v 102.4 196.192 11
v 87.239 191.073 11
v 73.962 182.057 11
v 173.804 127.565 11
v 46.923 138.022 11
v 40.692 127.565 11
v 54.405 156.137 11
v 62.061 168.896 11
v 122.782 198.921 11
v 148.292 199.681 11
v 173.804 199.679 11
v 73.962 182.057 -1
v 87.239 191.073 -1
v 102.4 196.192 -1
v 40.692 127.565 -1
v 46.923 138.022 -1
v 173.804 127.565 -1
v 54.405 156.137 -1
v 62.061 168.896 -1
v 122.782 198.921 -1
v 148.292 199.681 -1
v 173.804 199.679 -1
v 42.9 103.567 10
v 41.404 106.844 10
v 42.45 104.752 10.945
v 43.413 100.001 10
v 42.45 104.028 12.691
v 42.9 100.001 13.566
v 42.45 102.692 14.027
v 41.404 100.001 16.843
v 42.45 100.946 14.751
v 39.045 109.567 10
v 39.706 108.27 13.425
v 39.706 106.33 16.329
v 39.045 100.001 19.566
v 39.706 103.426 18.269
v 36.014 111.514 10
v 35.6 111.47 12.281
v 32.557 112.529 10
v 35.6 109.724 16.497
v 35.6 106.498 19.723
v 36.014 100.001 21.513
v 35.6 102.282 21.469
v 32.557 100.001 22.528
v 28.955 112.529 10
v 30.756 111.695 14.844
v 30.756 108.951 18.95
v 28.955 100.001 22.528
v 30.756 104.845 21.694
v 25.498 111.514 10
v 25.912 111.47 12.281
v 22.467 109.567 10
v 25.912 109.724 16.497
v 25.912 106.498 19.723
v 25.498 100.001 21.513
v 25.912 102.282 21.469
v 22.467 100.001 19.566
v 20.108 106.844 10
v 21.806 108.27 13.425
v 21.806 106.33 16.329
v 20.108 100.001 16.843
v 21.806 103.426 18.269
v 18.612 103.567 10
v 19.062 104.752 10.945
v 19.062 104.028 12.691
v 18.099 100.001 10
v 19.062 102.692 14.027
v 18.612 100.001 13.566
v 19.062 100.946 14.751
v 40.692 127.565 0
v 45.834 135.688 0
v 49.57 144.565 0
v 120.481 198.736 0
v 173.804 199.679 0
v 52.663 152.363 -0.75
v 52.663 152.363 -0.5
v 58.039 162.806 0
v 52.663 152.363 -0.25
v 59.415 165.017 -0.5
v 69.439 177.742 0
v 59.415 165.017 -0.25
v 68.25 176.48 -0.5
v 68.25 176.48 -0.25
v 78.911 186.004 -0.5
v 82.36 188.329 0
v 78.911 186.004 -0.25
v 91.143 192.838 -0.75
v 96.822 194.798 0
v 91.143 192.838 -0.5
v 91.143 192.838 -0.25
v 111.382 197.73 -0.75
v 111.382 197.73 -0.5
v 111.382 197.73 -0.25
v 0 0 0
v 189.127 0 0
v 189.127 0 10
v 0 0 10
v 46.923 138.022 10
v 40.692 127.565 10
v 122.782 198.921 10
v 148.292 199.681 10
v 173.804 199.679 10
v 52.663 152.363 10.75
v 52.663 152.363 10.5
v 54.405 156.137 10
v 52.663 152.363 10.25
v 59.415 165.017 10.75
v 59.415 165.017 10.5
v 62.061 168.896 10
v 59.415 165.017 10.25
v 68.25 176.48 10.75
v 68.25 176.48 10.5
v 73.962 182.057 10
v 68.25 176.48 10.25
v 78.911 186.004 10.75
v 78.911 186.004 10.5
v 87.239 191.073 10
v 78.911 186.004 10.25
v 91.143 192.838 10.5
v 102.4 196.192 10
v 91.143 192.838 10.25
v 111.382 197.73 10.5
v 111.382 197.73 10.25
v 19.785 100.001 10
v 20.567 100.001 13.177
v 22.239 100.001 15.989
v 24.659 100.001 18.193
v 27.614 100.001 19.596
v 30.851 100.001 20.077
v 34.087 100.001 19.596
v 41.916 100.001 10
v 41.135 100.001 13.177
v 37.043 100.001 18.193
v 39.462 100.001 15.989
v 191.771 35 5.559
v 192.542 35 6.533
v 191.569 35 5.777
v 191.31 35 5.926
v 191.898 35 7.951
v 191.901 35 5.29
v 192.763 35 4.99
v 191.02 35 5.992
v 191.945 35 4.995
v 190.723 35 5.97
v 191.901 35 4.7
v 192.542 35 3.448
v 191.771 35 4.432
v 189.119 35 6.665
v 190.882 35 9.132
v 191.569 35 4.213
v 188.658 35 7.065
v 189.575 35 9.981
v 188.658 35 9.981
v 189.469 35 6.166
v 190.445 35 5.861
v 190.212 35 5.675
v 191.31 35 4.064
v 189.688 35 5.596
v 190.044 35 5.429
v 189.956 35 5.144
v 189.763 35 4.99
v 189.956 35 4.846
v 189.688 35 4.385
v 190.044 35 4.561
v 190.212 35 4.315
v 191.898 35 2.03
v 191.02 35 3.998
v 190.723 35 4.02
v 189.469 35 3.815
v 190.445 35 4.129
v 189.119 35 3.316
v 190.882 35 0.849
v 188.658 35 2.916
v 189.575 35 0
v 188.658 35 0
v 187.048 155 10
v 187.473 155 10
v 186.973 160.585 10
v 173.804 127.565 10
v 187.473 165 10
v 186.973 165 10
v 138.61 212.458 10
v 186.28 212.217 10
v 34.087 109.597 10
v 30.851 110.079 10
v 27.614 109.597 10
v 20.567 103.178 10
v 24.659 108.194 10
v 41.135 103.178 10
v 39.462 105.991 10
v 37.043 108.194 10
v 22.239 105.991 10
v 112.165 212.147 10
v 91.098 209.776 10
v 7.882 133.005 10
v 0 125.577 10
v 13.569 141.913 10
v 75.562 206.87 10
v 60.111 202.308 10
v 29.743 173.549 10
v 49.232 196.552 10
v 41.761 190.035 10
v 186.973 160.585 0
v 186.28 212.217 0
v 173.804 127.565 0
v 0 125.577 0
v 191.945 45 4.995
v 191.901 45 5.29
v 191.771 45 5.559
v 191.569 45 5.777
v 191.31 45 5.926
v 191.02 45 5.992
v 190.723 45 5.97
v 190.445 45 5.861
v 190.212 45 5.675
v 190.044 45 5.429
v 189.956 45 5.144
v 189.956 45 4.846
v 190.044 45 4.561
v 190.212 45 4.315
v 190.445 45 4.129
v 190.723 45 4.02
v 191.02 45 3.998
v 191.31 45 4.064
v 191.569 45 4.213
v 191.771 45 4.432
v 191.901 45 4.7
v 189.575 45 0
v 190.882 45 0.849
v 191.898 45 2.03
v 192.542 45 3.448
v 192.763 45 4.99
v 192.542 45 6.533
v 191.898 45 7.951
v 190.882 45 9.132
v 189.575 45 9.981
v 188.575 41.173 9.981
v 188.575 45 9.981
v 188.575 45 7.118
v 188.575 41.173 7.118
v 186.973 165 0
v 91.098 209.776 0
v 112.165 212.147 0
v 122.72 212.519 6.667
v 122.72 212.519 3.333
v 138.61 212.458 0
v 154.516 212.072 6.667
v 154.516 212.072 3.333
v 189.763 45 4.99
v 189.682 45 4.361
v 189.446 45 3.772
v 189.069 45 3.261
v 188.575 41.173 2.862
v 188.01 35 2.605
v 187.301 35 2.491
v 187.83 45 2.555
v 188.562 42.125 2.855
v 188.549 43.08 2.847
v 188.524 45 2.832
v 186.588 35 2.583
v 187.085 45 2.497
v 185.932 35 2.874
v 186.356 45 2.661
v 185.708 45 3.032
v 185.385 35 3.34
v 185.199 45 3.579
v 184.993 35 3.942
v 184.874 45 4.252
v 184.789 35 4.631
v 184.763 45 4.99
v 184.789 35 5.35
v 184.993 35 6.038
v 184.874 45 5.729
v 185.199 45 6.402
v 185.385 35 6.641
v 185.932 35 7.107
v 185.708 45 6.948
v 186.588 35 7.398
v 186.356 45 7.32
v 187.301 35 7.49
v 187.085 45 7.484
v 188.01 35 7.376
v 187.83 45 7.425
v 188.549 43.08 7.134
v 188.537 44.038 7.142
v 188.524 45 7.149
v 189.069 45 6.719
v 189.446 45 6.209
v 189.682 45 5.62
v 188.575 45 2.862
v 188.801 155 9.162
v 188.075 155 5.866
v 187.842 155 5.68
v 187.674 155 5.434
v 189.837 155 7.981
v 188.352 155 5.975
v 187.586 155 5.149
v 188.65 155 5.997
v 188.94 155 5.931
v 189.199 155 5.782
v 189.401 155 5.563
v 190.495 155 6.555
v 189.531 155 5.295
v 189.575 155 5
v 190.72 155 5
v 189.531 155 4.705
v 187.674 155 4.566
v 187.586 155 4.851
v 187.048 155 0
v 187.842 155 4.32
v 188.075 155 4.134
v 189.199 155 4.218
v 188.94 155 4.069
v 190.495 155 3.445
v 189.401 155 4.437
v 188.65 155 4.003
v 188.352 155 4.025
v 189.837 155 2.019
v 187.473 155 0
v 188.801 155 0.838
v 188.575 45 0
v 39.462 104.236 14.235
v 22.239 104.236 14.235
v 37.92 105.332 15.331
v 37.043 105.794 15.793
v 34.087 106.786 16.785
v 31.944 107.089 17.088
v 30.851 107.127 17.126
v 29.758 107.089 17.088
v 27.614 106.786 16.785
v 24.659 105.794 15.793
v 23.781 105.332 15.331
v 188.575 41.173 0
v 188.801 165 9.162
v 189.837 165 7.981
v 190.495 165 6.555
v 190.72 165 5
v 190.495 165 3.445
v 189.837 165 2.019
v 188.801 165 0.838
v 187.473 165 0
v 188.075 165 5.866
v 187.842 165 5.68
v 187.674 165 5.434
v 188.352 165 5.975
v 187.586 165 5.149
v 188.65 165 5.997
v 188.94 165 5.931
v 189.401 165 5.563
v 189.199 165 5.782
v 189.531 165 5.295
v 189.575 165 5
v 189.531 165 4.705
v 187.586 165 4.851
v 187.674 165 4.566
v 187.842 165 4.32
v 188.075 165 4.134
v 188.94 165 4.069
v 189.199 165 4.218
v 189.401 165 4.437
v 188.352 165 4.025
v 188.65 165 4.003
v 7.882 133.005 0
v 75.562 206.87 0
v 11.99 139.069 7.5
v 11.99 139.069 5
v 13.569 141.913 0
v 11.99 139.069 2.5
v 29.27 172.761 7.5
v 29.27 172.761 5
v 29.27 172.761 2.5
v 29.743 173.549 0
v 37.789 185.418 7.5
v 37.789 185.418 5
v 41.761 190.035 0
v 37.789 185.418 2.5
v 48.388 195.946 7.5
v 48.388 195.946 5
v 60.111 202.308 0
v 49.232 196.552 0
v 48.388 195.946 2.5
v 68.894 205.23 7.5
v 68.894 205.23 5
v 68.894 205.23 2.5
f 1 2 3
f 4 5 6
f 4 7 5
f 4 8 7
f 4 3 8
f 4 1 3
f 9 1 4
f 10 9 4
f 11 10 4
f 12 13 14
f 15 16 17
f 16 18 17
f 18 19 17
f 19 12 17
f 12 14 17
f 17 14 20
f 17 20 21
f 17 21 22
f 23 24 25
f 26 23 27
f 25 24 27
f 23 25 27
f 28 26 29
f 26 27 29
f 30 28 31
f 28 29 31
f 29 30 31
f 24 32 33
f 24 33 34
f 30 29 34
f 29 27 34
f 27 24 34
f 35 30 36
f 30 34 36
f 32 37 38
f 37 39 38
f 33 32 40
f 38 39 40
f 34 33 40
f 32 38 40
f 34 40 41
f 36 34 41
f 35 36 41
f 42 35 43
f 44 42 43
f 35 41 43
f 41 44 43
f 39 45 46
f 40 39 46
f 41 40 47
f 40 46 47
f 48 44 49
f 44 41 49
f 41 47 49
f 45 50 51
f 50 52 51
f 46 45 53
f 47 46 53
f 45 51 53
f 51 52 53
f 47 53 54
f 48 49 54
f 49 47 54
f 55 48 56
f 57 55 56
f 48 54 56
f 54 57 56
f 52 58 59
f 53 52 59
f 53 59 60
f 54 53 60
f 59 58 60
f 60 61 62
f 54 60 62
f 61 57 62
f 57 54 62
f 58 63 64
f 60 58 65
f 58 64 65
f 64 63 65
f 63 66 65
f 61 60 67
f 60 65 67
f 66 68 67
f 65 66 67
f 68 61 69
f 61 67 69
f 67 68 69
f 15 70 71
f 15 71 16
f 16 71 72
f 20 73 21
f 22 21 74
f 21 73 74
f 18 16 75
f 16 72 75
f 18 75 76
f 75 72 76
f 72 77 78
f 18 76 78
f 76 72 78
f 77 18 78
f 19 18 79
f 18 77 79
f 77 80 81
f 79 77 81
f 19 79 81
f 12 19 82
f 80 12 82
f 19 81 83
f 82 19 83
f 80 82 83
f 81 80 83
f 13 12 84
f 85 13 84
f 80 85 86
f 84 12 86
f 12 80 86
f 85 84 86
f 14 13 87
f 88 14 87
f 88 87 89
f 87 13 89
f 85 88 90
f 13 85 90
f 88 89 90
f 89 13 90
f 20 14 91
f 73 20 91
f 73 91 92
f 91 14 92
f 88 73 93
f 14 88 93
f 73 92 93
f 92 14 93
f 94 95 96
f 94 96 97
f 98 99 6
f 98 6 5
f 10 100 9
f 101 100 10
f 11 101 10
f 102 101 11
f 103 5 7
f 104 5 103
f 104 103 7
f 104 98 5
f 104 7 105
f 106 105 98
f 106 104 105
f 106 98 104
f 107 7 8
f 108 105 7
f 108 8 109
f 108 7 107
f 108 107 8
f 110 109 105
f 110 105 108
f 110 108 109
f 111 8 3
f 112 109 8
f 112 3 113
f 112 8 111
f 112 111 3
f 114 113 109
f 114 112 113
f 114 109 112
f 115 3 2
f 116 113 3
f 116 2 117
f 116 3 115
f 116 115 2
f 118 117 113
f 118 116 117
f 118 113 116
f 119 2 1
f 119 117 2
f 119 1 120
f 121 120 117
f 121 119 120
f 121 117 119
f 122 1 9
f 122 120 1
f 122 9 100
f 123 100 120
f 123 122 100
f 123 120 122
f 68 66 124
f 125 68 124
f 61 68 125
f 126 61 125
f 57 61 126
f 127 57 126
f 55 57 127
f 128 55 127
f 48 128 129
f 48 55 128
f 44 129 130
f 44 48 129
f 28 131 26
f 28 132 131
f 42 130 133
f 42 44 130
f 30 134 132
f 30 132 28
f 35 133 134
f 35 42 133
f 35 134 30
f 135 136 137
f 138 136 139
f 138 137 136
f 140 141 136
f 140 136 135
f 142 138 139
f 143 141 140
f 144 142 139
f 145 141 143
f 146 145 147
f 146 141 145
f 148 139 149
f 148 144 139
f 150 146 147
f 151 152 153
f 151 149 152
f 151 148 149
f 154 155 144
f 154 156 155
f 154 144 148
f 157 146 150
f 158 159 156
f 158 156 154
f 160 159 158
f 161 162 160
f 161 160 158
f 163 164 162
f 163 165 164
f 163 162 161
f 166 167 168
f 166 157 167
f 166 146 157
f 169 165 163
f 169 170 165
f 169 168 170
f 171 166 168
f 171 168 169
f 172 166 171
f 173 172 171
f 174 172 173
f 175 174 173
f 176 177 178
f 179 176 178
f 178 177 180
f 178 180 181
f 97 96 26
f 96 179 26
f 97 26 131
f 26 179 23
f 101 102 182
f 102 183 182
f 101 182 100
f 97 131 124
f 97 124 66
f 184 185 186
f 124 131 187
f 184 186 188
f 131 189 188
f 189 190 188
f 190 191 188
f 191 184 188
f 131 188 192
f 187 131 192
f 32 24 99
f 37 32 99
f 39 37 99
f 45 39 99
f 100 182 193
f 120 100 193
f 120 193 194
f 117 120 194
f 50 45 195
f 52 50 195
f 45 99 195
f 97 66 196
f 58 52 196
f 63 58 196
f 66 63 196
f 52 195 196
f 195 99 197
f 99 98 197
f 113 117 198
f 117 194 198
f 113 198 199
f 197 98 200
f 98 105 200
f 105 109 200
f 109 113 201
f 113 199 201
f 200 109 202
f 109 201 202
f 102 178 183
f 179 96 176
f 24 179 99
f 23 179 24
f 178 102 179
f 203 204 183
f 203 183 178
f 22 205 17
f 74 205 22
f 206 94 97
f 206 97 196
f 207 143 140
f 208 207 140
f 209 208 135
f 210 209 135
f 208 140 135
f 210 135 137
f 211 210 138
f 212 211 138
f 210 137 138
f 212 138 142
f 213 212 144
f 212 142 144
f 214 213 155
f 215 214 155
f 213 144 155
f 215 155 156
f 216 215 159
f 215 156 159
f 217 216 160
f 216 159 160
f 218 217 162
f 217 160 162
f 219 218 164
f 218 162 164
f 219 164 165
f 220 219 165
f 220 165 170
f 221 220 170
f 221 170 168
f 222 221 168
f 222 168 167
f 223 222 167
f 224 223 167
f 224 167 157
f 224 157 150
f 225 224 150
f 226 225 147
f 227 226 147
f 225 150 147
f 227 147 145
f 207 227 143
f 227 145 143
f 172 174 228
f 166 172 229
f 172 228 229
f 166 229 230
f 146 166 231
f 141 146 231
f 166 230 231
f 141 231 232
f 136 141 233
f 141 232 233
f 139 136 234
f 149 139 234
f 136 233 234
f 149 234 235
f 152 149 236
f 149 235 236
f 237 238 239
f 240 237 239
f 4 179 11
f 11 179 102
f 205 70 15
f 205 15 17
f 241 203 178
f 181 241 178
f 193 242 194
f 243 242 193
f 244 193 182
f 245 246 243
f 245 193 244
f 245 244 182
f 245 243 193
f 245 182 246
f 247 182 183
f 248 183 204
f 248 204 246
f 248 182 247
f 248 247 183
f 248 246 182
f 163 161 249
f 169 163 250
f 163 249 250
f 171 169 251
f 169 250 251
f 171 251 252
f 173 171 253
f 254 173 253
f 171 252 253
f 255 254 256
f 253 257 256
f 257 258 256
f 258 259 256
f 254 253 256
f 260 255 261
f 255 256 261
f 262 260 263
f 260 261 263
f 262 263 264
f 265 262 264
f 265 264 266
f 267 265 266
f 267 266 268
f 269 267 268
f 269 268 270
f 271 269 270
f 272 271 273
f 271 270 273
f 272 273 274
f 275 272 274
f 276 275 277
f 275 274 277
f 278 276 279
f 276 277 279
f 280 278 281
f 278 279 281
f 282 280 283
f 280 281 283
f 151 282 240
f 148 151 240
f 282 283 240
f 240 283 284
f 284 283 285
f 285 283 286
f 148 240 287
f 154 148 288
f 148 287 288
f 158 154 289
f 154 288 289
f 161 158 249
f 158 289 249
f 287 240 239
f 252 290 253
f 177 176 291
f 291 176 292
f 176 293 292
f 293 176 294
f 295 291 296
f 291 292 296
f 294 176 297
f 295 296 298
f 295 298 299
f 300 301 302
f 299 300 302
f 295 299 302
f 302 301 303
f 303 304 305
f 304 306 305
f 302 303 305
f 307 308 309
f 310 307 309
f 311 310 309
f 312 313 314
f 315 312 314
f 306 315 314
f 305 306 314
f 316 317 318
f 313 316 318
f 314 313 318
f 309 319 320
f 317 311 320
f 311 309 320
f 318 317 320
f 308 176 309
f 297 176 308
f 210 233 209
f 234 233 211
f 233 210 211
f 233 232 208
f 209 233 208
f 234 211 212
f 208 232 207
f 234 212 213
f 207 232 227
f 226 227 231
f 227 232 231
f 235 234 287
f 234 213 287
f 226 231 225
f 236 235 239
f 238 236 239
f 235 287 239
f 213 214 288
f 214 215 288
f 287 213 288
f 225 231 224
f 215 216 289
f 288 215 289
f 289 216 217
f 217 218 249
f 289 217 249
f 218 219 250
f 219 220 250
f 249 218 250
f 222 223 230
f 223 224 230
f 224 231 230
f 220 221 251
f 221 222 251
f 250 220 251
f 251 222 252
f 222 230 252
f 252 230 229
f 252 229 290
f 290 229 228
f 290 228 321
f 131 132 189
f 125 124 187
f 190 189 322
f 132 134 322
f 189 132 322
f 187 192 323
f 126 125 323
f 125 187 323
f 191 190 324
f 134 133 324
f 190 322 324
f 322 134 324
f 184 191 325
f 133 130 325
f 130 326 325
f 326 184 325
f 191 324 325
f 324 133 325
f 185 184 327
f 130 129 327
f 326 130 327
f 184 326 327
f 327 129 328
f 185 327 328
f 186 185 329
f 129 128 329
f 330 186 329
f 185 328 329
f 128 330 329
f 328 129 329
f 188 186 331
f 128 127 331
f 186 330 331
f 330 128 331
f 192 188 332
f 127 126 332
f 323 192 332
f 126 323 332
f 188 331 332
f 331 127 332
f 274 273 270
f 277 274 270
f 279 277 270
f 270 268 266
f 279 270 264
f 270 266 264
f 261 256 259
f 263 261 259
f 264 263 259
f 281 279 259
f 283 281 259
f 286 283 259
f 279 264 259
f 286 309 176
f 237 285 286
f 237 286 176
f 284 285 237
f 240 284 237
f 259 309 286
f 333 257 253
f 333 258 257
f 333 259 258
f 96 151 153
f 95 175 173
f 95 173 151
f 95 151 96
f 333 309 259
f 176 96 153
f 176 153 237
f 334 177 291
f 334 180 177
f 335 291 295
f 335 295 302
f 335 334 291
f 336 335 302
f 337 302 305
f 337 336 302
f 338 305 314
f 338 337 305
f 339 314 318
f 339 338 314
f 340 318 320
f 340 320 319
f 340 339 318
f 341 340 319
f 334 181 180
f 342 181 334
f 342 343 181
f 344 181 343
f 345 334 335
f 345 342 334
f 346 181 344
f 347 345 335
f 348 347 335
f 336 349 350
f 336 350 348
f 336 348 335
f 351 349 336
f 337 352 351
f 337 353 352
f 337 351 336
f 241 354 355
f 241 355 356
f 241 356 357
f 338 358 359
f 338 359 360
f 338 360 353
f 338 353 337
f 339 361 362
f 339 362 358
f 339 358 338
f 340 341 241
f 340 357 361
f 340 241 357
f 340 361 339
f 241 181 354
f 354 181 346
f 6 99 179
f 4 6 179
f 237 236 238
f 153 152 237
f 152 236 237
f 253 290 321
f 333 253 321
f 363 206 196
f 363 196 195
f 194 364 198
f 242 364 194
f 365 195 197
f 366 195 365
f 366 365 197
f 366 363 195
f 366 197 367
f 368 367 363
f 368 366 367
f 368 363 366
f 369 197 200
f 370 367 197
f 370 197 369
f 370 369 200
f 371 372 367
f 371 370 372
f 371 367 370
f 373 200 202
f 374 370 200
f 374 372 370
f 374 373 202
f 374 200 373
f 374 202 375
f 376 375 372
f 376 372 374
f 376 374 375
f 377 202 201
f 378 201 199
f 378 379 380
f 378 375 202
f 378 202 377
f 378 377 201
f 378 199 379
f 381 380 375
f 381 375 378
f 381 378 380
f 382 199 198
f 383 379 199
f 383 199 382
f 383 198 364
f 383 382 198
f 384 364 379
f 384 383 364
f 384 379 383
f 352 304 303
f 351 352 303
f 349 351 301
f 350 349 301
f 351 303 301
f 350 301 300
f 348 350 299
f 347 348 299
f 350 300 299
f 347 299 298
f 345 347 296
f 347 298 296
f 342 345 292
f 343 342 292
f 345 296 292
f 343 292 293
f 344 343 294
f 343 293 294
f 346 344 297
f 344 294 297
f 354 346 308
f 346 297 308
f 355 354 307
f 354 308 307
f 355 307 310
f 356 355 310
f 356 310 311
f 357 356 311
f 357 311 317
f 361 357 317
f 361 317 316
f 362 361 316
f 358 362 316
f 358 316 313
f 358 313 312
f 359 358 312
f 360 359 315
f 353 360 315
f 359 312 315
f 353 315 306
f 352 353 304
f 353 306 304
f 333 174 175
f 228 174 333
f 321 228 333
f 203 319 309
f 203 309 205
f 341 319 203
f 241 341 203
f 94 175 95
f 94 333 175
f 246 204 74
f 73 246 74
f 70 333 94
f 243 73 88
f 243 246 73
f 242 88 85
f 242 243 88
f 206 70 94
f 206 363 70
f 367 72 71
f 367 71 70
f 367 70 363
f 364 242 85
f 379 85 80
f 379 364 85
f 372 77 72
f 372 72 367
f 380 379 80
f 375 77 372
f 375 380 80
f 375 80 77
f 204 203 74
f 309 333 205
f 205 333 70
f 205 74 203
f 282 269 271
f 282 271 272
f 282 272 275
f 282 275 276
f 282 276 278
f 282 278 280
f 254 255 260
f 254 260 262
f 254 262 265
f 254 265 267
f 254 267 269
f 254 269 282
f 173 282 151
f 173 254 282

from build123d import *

# Parameters (mm, degrees)
BOSS_EXTRUDE1_DEPTH          = 10
BOSS_EXTRUDE2_DEPTH          = 1
BOSS_EXTRUDE2_DEPTH_BACK     = 11
REVOLVE1_ANGLE               = 90
CUT_REVOLVE1_ANGLE           = 45
CUT_REVOLVE1_OTHER_WAY_ANGLE = 90
BOSS_EXTRUDE3_DEPTH          = 5
BOSS_EXTRUDE3_DEPTH_BACK     = 5
BOSS_EXTRUDE4_DEPTH          = 5
BOSS_EXTRUDE4_DEPTH_BACK     = 5
SKETCH19_R                   = 1
CUT_EXTRUDE3_DEPTH           = 10
SKETCH24_R                   = 1
CUT_EXTRUDE4_DEPTH           = 10
SKETCH21_R                   = 2.5
CUT_EXTRUDE2_DEPTH           = 10


with BuildPart() as part:
    # Sketch1 → Boss-Extrude1 (new body)
    with BuildSketch(Plane.XY):
        with BuildLine():
            Line((186.280110435, 212.216863761), (189.127439812, 0))
            Line((189.127439812, 0), (0, 0))
            Line((0, 0), (0, 125.576698411))
            add(Edge.make_bspline(
                [(0, 125.576698411), (10.557001905, 132.837635912), (17.098165485, 150.751131911), (30.538510921, 175.76338894), (49.352217031, 203.04075133), (76.867896029, 207.296992896), (91.097956951, 209.776295723)],
                knots=[0, 0, 0, 0, 0.275246051, 0.426571591, 0.655828837, 1, 1, 1, 1], degree=3))
            add(Edge.make_bspline(
                [(91.097956951, 209.776295723), (122.565116695, 215.374757588), (154.60100966, 210.515513687), (186.280110435, 212.216863761)],
                knots=[0, 0, 0, 0, 1, 1, 1, 1], degree=3))
        make_face()
    extrude(amount=BOSS_EXTRUDE1_DEPTH)

    # Sketch3 → Boss-Extrude2 (add, two sides: drawn at the far end of the back side and taken through both)
    with BuildSketch(Plane.XY.offset(10).offset(-BOSS_EXTRUDE2_DEPTH_BACK)):
        with BuildLine():
            Line((40.691917073, 127.565231362), (173.80372619, 127.565231362))
            Line((173.80372619, 127.565231362), (173.80372619, 199.679337801))
            add(Edge.make_bspline(
                [(40.691917073, 127.565231362), (46.771290341, 134.933306827), (53.369134393, 161.704453989), (78.457507643, 191.212262771), (124.31750344, 201.038762955), (152.264868916, 199.362802741), (173.80372619, 199.679337801)],
                knots=[0, 0, 0, 0, 0.16561761, 0.500501685, 0.611599227, 1, 1, 1, 1], degree=3))
        make_face()
    extrude(amount=BOSS_EXTRUDE2_DEPTH + BOSS_EXTRUDE2_DEPTH_BACK)

    # Sketch4 → Revolve1 (revolve)
    with BuildSketch(Plane.XY.offset(10)):
        with BuildLine():
            Line((18.099024499, 100.001165305), (43.413071111, 100.001165305))
            ThreePointArc((43.413071111, 100.001165305), (30.756047805, 112.658188611), (18.099024499, 100.001165305))
        make_face()
    revolve(axis=Axis((18.099024499, 100.001165305, 10), (1, 0, 0)), revolution_arc=REVOLVE1_ANGLE)

    # Sketch7 → Cut-Revolve1 (revolve, cut)
    with BuildSketch(Plane.XZ.offset(-100.001165305)):
        with BuildLine():
            Line((19.785436848, 10), (41.915940994, 10))
            ThreePointArc((41.915940994, 10), (30.850688921, 20.07738513), (19.785436848, 10))
        make_face()
    revolve(axis=Axis((19.785436848, 100.001165305, 10), (1, 0, 0)), revolution_arc=CUT_REVOLVE1_ANGLE, mode=Mode.SUBTRACT)

    # Sketch7 → Cut-Revolve1 other way (revolve, cut)
    with BuildSketch(Plane.XZ.offset(-100.001165305)):
        with BuildLine():
            Line((19.785436848, 10), (41.915940994, 10))
            ThreePointArc((41.915940994, 10), (30.850688921, 20.07738513), (19.785436848, 10))
        make_face()
    revolve(axis=Axis((19.785436848, 100.001165305, 10), (-1, 0, 0)), revolution_arc=CUT_REVOLVE1_OTHER_WAY_ANGLE, mode=Mode.SUBTRACT)

    # Sketch17 → Boss-Extrude3 (add, two sides: drawn at the far end of the back side and taken through both)
    with BuildSketch(Plane(origin=(0, 40, 0), x_dir=(-1, 0, 0), z_dir=(0, -1, 0)).offset(-BOSS_EXTRUDE3_DEPTH_BACK)):
        with BuildLine():
            Line((-188.57501815, 0), (-189.57501815, 0))
            ThreePointArc((-189.57501815, 0), (-192.762810227, -4.99036016), (-189.57501815, -9.98072032))
            Line((-189.57501815, -9.98072032), (-188.57501815, -9.98072032))
            Line((-188.57501815, -9.98072032), (-188.57501815, 0))
        make_face()
    extrude(amount=BOSS_EXTRUDE3_DEPTH + BOSS_EXTRUDE3_DEPTH_BACK)

    # Sketch18 → Boss-Extrude4 (add, two sides: drawn at the far end of the back side and taken through both)
    with BuildSketch(Plane(origin=(0, 160, 0), x_dir=(-1, 0, 0), z_dir=(0, -1, 0)).offset(-BOSS_EXTRUDE4_DEPTH_BACK)):
        with BuildLine():
            Line((-186.972854644, -10), (-187.472854644, -10))
            ThreePointArc((-187.472854644, -10), (-190.720096746, -5), (-187.472854644, 0))
            Line((-187.472854644, 0), (-186.972854644, 0))
            Line((-186.972854644, 0), (-186.972854644, -10))
        make_face()
    extrude(amount=BOSS_EXTRUDE4_DEPTH + BOSS_EXTRUDE4_DEPTH_BACK)

    # Sketch19 → Cut-Extrude3 (cut)
    with BuildSketch(Plane.XZ.offset(-155)):
        with Locations((188.57501815, 5)):
            Circle(SKETCH19_R)
    extrude(amount=-CUT_EXTRUDE3_DEPTH, mode=Mode.SUBTRACT)

    # Sketch24 → Cut-Extrude4 (cut)
    with BuildSketch(Plane.XZ.offset(-35)):
        with Locations((190.94512502, 4.99518008)):
            Circle(SKETCH24_R)
    extrude(amount=-CUT_EXTRUDE4_DEPTH, mode=Mode.SUBTRACT)

    # Sketch21 → Cut-Extrude2 (cut)
    with BuildSketch(Plane(origin=(0, 45, 0), x_dir=(1, 0, 0), z_dir=(0, 1, 0))):
        with Locations((187.262810227, -4.99036016)):
            Circle(SKETCH21_R)
    extrude(amount=-CUT_EXTRUDE2_DEPTH, mode=Mode.SUBTRACT)


solid = part.part
